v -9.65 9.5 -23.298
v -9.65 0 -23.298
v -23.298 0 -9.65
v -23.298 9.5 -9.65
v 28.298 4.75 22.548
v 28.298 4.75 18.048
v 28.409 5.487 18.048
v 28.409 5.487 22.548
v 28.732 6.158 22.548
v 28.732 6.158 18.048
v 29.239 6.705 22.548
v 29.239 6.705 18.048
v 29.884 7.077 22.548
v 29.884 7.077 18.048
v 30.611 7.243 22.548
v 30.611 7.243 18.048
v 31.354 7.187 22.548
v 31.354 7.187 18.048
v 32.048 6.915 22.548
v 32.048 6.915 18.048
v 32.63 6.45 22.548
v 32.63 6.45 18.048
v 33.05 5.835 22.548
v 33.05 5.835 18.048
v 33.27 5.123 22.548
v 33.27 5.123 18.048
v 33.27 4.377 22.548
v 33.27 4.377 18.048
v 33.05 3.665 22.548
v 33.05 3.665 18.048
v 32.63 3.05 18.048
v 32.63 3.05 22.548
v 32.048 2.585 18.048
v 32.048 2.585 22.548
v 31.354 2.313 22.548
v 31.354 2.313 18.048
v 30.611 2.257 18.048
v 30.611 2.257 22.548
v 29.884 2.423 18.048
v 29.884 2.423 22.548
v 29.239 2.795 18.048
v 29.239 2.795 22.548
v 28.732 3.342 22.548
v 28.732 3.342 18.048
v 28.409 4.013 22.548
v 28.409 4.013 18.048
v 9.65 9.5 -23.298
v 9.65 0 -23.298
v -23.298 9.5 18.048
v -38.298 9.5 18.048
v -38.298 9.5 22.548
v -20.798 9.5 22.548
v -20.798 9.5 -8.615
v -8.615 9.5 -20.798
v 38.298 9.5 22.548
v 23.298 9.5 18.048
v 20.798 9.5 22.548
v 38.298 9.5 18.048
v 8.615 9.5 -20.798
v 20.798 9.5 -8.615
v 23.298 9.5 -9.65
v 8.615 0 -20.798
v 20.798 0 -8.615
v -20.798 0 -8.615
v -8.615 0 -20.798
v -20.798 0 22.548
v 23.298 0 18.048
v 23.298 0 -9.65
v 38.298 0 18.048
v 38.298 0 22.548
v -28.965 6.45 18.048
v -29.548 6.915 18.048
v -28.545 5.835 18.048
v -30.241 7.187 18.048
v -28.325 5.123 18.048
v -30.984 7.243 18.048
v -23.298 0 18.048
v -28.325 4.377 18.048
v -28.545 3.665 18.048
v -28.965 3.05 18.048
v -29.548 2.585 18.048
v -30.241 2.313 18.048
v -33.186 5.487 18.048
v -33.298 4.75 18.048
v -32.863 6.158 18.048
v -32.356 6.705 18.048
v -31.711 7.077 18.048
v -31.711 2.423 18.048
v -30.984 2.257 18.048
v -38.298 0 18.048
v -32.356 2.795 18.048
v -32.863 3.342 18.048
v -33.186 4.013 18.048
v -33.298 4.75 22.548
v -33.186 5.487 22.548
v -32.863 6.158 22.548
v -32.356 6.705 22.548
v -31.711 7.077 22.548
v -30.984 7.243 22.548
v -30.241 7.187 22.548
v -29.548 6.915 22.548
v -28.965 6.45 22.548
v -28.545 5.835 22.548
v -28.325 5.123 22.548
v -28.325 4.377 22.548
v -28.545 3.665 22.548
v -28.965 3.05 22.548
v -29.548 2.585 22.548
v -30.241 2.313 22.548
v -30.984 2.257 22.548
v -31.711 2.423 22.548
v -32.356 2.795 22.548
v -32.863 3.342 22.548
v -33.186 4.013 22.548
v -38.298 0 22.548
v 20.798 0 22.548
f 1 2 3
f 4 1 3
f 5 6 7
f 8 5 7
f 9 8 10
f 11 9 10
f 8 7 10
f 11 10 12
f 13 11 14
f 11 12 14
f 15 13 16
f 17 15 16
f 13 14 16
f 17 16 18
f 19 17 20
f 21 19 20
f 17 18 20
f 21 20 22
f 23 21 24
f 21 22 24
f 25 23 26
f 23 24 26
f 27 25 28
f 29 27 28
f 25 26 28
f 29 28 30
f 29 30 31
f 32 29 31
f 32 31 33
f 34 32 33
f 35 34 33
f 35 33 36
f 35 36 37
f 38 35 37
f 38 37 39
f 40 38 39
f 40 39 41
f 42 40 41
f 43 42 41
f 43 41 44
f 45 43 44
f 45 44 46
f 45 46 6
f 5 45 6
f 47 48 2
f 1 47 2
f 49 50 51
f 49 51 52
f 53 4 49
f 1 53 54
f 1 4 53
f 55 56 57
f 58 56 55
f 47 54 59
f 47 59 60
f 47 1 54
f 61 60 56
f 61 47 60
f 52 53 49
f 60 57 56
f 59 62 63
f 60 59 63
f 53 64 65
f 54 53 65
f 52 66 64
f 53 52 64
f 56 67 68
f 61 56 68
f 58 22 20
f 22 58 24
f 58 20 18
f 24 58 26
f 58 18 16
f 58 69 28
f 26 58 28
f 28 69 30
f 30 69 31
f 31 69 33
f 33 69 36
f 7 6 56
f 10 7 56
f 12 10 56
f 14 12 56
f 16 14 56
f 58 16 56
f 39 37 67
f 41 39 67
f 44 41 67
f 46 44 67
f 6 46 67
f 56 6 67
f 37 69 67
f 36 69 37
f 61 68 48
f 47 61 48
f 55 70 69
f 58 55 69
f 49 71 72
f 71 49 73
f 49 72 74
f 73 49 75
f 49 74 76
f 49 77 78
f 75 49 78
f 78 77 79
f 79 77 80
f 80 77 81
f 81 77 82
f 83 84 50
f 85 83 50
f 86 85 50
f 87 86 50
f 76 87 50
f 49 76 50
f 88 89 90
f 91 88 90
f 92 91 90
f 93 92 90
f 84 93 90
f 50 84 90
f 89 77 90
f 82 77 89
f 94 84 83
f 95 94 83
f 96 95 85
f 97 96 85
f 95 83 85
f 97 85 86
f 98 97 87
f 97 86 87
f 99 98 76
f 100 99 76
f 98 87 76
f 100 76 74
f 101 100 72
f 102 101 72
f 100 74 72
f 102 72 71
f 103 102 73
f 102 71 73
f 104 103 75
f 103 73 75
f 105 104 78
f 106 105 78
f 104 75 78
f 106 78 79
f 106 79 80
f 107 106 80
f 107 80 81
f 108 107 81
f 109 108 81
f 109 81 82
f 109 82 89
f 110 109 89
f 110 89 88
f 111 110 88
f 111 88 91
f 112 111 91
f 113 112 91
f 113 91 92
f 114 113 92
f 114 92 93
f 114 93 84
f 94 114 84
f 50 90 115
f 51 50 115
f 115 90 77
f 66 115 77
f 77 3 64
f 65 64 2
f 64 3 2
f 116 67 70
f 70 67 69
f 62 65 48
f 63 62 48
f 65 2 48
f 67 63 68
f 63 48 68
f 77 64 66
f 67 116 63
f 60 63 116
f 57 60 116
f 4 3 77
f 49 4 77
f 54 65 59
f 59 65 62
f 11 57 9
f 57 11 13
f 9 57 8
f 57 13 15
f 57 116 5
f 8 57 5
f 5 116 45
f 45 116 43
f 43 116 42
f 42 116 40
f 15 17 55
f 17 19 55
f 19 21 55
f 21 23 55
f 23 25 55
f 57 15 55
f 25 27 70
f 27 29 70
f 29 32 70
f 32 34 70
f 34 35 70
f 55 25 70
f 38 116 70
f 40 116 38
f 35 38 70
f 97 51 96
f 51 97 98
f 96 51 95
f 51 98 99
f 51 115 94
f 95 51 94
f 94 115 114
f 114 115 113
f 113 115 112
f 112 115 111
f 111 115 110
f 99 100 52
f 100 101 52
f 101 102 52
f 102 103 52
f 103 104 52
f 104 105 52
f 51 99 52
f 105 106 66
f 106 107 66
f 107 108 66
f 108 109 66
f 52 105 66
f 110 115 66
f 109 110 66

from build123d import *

# Parameters (mm, degrees)
BOSS_EXTRUDE1_DEPTH = 9.5
SKETCH3_R           = 2.5
CUT_EXTRUDE1_DEPTH  = 9.5


with BuildPart() as part:
    # Sketch2 → Boss-Extrude1 (new body)
    with BuildSketch(Plane(origin=(0, 0, 0), x_dir=(1, 0, 0), z_dir=(0, 1, 0))):
        Polygon((-9.650154056, 23.297532801), (-23.297532801, 9.650154056), (-23.297532801, -9.650154056), (-23.297532801, -18.047532806), (-38.297532801, -18.047532806), (-38.297532801, -22.547532806), (-23.297532801, -22.547532806), (-20.797532801, -22.547532806), (-20.797532801, -12.150154056), (-20.797532801, -8.61462015), (-20.797532801, 8.61462015), (-8.61462015, 20.797532801), (8.61462015, 20.797532801), (20.797532801, 8.61462015), (20.797532801, -8.61462015), (20.797532801, -12.150154056), (20.797532801, -22.547532806), (23.297532801, -22.547532806), (38.297532801, -22.547532806), (38.297532801, -18.047532806), (23.297532801, -18.047532806), (23.297532801, -9.650154056), (23.297532801, 9.650154056), (9.650154056, 23.297532801), align=None)
    extrude(amount=BOSS_EXTRUDE1_DEPTH)

    # Sketch3 → Cut-Extrude1 (cut)
    with BuildSketch(Plane(origin=(0, 0, 18.047532806), x_dir=(-1, 0, 0), z_dir=(0, 0, -1))):
        with Locations((30.797532801, 4.75)):
            Circle(SKETCH3_R)
        with Locations((-30.797532801, 4.75)):
            Circle(SKETCH3_R)
    extrude(amount=-CUT_EXTRUDE1_DEPTH, mode=Mode.SUBTRACT)


solid = part.part
